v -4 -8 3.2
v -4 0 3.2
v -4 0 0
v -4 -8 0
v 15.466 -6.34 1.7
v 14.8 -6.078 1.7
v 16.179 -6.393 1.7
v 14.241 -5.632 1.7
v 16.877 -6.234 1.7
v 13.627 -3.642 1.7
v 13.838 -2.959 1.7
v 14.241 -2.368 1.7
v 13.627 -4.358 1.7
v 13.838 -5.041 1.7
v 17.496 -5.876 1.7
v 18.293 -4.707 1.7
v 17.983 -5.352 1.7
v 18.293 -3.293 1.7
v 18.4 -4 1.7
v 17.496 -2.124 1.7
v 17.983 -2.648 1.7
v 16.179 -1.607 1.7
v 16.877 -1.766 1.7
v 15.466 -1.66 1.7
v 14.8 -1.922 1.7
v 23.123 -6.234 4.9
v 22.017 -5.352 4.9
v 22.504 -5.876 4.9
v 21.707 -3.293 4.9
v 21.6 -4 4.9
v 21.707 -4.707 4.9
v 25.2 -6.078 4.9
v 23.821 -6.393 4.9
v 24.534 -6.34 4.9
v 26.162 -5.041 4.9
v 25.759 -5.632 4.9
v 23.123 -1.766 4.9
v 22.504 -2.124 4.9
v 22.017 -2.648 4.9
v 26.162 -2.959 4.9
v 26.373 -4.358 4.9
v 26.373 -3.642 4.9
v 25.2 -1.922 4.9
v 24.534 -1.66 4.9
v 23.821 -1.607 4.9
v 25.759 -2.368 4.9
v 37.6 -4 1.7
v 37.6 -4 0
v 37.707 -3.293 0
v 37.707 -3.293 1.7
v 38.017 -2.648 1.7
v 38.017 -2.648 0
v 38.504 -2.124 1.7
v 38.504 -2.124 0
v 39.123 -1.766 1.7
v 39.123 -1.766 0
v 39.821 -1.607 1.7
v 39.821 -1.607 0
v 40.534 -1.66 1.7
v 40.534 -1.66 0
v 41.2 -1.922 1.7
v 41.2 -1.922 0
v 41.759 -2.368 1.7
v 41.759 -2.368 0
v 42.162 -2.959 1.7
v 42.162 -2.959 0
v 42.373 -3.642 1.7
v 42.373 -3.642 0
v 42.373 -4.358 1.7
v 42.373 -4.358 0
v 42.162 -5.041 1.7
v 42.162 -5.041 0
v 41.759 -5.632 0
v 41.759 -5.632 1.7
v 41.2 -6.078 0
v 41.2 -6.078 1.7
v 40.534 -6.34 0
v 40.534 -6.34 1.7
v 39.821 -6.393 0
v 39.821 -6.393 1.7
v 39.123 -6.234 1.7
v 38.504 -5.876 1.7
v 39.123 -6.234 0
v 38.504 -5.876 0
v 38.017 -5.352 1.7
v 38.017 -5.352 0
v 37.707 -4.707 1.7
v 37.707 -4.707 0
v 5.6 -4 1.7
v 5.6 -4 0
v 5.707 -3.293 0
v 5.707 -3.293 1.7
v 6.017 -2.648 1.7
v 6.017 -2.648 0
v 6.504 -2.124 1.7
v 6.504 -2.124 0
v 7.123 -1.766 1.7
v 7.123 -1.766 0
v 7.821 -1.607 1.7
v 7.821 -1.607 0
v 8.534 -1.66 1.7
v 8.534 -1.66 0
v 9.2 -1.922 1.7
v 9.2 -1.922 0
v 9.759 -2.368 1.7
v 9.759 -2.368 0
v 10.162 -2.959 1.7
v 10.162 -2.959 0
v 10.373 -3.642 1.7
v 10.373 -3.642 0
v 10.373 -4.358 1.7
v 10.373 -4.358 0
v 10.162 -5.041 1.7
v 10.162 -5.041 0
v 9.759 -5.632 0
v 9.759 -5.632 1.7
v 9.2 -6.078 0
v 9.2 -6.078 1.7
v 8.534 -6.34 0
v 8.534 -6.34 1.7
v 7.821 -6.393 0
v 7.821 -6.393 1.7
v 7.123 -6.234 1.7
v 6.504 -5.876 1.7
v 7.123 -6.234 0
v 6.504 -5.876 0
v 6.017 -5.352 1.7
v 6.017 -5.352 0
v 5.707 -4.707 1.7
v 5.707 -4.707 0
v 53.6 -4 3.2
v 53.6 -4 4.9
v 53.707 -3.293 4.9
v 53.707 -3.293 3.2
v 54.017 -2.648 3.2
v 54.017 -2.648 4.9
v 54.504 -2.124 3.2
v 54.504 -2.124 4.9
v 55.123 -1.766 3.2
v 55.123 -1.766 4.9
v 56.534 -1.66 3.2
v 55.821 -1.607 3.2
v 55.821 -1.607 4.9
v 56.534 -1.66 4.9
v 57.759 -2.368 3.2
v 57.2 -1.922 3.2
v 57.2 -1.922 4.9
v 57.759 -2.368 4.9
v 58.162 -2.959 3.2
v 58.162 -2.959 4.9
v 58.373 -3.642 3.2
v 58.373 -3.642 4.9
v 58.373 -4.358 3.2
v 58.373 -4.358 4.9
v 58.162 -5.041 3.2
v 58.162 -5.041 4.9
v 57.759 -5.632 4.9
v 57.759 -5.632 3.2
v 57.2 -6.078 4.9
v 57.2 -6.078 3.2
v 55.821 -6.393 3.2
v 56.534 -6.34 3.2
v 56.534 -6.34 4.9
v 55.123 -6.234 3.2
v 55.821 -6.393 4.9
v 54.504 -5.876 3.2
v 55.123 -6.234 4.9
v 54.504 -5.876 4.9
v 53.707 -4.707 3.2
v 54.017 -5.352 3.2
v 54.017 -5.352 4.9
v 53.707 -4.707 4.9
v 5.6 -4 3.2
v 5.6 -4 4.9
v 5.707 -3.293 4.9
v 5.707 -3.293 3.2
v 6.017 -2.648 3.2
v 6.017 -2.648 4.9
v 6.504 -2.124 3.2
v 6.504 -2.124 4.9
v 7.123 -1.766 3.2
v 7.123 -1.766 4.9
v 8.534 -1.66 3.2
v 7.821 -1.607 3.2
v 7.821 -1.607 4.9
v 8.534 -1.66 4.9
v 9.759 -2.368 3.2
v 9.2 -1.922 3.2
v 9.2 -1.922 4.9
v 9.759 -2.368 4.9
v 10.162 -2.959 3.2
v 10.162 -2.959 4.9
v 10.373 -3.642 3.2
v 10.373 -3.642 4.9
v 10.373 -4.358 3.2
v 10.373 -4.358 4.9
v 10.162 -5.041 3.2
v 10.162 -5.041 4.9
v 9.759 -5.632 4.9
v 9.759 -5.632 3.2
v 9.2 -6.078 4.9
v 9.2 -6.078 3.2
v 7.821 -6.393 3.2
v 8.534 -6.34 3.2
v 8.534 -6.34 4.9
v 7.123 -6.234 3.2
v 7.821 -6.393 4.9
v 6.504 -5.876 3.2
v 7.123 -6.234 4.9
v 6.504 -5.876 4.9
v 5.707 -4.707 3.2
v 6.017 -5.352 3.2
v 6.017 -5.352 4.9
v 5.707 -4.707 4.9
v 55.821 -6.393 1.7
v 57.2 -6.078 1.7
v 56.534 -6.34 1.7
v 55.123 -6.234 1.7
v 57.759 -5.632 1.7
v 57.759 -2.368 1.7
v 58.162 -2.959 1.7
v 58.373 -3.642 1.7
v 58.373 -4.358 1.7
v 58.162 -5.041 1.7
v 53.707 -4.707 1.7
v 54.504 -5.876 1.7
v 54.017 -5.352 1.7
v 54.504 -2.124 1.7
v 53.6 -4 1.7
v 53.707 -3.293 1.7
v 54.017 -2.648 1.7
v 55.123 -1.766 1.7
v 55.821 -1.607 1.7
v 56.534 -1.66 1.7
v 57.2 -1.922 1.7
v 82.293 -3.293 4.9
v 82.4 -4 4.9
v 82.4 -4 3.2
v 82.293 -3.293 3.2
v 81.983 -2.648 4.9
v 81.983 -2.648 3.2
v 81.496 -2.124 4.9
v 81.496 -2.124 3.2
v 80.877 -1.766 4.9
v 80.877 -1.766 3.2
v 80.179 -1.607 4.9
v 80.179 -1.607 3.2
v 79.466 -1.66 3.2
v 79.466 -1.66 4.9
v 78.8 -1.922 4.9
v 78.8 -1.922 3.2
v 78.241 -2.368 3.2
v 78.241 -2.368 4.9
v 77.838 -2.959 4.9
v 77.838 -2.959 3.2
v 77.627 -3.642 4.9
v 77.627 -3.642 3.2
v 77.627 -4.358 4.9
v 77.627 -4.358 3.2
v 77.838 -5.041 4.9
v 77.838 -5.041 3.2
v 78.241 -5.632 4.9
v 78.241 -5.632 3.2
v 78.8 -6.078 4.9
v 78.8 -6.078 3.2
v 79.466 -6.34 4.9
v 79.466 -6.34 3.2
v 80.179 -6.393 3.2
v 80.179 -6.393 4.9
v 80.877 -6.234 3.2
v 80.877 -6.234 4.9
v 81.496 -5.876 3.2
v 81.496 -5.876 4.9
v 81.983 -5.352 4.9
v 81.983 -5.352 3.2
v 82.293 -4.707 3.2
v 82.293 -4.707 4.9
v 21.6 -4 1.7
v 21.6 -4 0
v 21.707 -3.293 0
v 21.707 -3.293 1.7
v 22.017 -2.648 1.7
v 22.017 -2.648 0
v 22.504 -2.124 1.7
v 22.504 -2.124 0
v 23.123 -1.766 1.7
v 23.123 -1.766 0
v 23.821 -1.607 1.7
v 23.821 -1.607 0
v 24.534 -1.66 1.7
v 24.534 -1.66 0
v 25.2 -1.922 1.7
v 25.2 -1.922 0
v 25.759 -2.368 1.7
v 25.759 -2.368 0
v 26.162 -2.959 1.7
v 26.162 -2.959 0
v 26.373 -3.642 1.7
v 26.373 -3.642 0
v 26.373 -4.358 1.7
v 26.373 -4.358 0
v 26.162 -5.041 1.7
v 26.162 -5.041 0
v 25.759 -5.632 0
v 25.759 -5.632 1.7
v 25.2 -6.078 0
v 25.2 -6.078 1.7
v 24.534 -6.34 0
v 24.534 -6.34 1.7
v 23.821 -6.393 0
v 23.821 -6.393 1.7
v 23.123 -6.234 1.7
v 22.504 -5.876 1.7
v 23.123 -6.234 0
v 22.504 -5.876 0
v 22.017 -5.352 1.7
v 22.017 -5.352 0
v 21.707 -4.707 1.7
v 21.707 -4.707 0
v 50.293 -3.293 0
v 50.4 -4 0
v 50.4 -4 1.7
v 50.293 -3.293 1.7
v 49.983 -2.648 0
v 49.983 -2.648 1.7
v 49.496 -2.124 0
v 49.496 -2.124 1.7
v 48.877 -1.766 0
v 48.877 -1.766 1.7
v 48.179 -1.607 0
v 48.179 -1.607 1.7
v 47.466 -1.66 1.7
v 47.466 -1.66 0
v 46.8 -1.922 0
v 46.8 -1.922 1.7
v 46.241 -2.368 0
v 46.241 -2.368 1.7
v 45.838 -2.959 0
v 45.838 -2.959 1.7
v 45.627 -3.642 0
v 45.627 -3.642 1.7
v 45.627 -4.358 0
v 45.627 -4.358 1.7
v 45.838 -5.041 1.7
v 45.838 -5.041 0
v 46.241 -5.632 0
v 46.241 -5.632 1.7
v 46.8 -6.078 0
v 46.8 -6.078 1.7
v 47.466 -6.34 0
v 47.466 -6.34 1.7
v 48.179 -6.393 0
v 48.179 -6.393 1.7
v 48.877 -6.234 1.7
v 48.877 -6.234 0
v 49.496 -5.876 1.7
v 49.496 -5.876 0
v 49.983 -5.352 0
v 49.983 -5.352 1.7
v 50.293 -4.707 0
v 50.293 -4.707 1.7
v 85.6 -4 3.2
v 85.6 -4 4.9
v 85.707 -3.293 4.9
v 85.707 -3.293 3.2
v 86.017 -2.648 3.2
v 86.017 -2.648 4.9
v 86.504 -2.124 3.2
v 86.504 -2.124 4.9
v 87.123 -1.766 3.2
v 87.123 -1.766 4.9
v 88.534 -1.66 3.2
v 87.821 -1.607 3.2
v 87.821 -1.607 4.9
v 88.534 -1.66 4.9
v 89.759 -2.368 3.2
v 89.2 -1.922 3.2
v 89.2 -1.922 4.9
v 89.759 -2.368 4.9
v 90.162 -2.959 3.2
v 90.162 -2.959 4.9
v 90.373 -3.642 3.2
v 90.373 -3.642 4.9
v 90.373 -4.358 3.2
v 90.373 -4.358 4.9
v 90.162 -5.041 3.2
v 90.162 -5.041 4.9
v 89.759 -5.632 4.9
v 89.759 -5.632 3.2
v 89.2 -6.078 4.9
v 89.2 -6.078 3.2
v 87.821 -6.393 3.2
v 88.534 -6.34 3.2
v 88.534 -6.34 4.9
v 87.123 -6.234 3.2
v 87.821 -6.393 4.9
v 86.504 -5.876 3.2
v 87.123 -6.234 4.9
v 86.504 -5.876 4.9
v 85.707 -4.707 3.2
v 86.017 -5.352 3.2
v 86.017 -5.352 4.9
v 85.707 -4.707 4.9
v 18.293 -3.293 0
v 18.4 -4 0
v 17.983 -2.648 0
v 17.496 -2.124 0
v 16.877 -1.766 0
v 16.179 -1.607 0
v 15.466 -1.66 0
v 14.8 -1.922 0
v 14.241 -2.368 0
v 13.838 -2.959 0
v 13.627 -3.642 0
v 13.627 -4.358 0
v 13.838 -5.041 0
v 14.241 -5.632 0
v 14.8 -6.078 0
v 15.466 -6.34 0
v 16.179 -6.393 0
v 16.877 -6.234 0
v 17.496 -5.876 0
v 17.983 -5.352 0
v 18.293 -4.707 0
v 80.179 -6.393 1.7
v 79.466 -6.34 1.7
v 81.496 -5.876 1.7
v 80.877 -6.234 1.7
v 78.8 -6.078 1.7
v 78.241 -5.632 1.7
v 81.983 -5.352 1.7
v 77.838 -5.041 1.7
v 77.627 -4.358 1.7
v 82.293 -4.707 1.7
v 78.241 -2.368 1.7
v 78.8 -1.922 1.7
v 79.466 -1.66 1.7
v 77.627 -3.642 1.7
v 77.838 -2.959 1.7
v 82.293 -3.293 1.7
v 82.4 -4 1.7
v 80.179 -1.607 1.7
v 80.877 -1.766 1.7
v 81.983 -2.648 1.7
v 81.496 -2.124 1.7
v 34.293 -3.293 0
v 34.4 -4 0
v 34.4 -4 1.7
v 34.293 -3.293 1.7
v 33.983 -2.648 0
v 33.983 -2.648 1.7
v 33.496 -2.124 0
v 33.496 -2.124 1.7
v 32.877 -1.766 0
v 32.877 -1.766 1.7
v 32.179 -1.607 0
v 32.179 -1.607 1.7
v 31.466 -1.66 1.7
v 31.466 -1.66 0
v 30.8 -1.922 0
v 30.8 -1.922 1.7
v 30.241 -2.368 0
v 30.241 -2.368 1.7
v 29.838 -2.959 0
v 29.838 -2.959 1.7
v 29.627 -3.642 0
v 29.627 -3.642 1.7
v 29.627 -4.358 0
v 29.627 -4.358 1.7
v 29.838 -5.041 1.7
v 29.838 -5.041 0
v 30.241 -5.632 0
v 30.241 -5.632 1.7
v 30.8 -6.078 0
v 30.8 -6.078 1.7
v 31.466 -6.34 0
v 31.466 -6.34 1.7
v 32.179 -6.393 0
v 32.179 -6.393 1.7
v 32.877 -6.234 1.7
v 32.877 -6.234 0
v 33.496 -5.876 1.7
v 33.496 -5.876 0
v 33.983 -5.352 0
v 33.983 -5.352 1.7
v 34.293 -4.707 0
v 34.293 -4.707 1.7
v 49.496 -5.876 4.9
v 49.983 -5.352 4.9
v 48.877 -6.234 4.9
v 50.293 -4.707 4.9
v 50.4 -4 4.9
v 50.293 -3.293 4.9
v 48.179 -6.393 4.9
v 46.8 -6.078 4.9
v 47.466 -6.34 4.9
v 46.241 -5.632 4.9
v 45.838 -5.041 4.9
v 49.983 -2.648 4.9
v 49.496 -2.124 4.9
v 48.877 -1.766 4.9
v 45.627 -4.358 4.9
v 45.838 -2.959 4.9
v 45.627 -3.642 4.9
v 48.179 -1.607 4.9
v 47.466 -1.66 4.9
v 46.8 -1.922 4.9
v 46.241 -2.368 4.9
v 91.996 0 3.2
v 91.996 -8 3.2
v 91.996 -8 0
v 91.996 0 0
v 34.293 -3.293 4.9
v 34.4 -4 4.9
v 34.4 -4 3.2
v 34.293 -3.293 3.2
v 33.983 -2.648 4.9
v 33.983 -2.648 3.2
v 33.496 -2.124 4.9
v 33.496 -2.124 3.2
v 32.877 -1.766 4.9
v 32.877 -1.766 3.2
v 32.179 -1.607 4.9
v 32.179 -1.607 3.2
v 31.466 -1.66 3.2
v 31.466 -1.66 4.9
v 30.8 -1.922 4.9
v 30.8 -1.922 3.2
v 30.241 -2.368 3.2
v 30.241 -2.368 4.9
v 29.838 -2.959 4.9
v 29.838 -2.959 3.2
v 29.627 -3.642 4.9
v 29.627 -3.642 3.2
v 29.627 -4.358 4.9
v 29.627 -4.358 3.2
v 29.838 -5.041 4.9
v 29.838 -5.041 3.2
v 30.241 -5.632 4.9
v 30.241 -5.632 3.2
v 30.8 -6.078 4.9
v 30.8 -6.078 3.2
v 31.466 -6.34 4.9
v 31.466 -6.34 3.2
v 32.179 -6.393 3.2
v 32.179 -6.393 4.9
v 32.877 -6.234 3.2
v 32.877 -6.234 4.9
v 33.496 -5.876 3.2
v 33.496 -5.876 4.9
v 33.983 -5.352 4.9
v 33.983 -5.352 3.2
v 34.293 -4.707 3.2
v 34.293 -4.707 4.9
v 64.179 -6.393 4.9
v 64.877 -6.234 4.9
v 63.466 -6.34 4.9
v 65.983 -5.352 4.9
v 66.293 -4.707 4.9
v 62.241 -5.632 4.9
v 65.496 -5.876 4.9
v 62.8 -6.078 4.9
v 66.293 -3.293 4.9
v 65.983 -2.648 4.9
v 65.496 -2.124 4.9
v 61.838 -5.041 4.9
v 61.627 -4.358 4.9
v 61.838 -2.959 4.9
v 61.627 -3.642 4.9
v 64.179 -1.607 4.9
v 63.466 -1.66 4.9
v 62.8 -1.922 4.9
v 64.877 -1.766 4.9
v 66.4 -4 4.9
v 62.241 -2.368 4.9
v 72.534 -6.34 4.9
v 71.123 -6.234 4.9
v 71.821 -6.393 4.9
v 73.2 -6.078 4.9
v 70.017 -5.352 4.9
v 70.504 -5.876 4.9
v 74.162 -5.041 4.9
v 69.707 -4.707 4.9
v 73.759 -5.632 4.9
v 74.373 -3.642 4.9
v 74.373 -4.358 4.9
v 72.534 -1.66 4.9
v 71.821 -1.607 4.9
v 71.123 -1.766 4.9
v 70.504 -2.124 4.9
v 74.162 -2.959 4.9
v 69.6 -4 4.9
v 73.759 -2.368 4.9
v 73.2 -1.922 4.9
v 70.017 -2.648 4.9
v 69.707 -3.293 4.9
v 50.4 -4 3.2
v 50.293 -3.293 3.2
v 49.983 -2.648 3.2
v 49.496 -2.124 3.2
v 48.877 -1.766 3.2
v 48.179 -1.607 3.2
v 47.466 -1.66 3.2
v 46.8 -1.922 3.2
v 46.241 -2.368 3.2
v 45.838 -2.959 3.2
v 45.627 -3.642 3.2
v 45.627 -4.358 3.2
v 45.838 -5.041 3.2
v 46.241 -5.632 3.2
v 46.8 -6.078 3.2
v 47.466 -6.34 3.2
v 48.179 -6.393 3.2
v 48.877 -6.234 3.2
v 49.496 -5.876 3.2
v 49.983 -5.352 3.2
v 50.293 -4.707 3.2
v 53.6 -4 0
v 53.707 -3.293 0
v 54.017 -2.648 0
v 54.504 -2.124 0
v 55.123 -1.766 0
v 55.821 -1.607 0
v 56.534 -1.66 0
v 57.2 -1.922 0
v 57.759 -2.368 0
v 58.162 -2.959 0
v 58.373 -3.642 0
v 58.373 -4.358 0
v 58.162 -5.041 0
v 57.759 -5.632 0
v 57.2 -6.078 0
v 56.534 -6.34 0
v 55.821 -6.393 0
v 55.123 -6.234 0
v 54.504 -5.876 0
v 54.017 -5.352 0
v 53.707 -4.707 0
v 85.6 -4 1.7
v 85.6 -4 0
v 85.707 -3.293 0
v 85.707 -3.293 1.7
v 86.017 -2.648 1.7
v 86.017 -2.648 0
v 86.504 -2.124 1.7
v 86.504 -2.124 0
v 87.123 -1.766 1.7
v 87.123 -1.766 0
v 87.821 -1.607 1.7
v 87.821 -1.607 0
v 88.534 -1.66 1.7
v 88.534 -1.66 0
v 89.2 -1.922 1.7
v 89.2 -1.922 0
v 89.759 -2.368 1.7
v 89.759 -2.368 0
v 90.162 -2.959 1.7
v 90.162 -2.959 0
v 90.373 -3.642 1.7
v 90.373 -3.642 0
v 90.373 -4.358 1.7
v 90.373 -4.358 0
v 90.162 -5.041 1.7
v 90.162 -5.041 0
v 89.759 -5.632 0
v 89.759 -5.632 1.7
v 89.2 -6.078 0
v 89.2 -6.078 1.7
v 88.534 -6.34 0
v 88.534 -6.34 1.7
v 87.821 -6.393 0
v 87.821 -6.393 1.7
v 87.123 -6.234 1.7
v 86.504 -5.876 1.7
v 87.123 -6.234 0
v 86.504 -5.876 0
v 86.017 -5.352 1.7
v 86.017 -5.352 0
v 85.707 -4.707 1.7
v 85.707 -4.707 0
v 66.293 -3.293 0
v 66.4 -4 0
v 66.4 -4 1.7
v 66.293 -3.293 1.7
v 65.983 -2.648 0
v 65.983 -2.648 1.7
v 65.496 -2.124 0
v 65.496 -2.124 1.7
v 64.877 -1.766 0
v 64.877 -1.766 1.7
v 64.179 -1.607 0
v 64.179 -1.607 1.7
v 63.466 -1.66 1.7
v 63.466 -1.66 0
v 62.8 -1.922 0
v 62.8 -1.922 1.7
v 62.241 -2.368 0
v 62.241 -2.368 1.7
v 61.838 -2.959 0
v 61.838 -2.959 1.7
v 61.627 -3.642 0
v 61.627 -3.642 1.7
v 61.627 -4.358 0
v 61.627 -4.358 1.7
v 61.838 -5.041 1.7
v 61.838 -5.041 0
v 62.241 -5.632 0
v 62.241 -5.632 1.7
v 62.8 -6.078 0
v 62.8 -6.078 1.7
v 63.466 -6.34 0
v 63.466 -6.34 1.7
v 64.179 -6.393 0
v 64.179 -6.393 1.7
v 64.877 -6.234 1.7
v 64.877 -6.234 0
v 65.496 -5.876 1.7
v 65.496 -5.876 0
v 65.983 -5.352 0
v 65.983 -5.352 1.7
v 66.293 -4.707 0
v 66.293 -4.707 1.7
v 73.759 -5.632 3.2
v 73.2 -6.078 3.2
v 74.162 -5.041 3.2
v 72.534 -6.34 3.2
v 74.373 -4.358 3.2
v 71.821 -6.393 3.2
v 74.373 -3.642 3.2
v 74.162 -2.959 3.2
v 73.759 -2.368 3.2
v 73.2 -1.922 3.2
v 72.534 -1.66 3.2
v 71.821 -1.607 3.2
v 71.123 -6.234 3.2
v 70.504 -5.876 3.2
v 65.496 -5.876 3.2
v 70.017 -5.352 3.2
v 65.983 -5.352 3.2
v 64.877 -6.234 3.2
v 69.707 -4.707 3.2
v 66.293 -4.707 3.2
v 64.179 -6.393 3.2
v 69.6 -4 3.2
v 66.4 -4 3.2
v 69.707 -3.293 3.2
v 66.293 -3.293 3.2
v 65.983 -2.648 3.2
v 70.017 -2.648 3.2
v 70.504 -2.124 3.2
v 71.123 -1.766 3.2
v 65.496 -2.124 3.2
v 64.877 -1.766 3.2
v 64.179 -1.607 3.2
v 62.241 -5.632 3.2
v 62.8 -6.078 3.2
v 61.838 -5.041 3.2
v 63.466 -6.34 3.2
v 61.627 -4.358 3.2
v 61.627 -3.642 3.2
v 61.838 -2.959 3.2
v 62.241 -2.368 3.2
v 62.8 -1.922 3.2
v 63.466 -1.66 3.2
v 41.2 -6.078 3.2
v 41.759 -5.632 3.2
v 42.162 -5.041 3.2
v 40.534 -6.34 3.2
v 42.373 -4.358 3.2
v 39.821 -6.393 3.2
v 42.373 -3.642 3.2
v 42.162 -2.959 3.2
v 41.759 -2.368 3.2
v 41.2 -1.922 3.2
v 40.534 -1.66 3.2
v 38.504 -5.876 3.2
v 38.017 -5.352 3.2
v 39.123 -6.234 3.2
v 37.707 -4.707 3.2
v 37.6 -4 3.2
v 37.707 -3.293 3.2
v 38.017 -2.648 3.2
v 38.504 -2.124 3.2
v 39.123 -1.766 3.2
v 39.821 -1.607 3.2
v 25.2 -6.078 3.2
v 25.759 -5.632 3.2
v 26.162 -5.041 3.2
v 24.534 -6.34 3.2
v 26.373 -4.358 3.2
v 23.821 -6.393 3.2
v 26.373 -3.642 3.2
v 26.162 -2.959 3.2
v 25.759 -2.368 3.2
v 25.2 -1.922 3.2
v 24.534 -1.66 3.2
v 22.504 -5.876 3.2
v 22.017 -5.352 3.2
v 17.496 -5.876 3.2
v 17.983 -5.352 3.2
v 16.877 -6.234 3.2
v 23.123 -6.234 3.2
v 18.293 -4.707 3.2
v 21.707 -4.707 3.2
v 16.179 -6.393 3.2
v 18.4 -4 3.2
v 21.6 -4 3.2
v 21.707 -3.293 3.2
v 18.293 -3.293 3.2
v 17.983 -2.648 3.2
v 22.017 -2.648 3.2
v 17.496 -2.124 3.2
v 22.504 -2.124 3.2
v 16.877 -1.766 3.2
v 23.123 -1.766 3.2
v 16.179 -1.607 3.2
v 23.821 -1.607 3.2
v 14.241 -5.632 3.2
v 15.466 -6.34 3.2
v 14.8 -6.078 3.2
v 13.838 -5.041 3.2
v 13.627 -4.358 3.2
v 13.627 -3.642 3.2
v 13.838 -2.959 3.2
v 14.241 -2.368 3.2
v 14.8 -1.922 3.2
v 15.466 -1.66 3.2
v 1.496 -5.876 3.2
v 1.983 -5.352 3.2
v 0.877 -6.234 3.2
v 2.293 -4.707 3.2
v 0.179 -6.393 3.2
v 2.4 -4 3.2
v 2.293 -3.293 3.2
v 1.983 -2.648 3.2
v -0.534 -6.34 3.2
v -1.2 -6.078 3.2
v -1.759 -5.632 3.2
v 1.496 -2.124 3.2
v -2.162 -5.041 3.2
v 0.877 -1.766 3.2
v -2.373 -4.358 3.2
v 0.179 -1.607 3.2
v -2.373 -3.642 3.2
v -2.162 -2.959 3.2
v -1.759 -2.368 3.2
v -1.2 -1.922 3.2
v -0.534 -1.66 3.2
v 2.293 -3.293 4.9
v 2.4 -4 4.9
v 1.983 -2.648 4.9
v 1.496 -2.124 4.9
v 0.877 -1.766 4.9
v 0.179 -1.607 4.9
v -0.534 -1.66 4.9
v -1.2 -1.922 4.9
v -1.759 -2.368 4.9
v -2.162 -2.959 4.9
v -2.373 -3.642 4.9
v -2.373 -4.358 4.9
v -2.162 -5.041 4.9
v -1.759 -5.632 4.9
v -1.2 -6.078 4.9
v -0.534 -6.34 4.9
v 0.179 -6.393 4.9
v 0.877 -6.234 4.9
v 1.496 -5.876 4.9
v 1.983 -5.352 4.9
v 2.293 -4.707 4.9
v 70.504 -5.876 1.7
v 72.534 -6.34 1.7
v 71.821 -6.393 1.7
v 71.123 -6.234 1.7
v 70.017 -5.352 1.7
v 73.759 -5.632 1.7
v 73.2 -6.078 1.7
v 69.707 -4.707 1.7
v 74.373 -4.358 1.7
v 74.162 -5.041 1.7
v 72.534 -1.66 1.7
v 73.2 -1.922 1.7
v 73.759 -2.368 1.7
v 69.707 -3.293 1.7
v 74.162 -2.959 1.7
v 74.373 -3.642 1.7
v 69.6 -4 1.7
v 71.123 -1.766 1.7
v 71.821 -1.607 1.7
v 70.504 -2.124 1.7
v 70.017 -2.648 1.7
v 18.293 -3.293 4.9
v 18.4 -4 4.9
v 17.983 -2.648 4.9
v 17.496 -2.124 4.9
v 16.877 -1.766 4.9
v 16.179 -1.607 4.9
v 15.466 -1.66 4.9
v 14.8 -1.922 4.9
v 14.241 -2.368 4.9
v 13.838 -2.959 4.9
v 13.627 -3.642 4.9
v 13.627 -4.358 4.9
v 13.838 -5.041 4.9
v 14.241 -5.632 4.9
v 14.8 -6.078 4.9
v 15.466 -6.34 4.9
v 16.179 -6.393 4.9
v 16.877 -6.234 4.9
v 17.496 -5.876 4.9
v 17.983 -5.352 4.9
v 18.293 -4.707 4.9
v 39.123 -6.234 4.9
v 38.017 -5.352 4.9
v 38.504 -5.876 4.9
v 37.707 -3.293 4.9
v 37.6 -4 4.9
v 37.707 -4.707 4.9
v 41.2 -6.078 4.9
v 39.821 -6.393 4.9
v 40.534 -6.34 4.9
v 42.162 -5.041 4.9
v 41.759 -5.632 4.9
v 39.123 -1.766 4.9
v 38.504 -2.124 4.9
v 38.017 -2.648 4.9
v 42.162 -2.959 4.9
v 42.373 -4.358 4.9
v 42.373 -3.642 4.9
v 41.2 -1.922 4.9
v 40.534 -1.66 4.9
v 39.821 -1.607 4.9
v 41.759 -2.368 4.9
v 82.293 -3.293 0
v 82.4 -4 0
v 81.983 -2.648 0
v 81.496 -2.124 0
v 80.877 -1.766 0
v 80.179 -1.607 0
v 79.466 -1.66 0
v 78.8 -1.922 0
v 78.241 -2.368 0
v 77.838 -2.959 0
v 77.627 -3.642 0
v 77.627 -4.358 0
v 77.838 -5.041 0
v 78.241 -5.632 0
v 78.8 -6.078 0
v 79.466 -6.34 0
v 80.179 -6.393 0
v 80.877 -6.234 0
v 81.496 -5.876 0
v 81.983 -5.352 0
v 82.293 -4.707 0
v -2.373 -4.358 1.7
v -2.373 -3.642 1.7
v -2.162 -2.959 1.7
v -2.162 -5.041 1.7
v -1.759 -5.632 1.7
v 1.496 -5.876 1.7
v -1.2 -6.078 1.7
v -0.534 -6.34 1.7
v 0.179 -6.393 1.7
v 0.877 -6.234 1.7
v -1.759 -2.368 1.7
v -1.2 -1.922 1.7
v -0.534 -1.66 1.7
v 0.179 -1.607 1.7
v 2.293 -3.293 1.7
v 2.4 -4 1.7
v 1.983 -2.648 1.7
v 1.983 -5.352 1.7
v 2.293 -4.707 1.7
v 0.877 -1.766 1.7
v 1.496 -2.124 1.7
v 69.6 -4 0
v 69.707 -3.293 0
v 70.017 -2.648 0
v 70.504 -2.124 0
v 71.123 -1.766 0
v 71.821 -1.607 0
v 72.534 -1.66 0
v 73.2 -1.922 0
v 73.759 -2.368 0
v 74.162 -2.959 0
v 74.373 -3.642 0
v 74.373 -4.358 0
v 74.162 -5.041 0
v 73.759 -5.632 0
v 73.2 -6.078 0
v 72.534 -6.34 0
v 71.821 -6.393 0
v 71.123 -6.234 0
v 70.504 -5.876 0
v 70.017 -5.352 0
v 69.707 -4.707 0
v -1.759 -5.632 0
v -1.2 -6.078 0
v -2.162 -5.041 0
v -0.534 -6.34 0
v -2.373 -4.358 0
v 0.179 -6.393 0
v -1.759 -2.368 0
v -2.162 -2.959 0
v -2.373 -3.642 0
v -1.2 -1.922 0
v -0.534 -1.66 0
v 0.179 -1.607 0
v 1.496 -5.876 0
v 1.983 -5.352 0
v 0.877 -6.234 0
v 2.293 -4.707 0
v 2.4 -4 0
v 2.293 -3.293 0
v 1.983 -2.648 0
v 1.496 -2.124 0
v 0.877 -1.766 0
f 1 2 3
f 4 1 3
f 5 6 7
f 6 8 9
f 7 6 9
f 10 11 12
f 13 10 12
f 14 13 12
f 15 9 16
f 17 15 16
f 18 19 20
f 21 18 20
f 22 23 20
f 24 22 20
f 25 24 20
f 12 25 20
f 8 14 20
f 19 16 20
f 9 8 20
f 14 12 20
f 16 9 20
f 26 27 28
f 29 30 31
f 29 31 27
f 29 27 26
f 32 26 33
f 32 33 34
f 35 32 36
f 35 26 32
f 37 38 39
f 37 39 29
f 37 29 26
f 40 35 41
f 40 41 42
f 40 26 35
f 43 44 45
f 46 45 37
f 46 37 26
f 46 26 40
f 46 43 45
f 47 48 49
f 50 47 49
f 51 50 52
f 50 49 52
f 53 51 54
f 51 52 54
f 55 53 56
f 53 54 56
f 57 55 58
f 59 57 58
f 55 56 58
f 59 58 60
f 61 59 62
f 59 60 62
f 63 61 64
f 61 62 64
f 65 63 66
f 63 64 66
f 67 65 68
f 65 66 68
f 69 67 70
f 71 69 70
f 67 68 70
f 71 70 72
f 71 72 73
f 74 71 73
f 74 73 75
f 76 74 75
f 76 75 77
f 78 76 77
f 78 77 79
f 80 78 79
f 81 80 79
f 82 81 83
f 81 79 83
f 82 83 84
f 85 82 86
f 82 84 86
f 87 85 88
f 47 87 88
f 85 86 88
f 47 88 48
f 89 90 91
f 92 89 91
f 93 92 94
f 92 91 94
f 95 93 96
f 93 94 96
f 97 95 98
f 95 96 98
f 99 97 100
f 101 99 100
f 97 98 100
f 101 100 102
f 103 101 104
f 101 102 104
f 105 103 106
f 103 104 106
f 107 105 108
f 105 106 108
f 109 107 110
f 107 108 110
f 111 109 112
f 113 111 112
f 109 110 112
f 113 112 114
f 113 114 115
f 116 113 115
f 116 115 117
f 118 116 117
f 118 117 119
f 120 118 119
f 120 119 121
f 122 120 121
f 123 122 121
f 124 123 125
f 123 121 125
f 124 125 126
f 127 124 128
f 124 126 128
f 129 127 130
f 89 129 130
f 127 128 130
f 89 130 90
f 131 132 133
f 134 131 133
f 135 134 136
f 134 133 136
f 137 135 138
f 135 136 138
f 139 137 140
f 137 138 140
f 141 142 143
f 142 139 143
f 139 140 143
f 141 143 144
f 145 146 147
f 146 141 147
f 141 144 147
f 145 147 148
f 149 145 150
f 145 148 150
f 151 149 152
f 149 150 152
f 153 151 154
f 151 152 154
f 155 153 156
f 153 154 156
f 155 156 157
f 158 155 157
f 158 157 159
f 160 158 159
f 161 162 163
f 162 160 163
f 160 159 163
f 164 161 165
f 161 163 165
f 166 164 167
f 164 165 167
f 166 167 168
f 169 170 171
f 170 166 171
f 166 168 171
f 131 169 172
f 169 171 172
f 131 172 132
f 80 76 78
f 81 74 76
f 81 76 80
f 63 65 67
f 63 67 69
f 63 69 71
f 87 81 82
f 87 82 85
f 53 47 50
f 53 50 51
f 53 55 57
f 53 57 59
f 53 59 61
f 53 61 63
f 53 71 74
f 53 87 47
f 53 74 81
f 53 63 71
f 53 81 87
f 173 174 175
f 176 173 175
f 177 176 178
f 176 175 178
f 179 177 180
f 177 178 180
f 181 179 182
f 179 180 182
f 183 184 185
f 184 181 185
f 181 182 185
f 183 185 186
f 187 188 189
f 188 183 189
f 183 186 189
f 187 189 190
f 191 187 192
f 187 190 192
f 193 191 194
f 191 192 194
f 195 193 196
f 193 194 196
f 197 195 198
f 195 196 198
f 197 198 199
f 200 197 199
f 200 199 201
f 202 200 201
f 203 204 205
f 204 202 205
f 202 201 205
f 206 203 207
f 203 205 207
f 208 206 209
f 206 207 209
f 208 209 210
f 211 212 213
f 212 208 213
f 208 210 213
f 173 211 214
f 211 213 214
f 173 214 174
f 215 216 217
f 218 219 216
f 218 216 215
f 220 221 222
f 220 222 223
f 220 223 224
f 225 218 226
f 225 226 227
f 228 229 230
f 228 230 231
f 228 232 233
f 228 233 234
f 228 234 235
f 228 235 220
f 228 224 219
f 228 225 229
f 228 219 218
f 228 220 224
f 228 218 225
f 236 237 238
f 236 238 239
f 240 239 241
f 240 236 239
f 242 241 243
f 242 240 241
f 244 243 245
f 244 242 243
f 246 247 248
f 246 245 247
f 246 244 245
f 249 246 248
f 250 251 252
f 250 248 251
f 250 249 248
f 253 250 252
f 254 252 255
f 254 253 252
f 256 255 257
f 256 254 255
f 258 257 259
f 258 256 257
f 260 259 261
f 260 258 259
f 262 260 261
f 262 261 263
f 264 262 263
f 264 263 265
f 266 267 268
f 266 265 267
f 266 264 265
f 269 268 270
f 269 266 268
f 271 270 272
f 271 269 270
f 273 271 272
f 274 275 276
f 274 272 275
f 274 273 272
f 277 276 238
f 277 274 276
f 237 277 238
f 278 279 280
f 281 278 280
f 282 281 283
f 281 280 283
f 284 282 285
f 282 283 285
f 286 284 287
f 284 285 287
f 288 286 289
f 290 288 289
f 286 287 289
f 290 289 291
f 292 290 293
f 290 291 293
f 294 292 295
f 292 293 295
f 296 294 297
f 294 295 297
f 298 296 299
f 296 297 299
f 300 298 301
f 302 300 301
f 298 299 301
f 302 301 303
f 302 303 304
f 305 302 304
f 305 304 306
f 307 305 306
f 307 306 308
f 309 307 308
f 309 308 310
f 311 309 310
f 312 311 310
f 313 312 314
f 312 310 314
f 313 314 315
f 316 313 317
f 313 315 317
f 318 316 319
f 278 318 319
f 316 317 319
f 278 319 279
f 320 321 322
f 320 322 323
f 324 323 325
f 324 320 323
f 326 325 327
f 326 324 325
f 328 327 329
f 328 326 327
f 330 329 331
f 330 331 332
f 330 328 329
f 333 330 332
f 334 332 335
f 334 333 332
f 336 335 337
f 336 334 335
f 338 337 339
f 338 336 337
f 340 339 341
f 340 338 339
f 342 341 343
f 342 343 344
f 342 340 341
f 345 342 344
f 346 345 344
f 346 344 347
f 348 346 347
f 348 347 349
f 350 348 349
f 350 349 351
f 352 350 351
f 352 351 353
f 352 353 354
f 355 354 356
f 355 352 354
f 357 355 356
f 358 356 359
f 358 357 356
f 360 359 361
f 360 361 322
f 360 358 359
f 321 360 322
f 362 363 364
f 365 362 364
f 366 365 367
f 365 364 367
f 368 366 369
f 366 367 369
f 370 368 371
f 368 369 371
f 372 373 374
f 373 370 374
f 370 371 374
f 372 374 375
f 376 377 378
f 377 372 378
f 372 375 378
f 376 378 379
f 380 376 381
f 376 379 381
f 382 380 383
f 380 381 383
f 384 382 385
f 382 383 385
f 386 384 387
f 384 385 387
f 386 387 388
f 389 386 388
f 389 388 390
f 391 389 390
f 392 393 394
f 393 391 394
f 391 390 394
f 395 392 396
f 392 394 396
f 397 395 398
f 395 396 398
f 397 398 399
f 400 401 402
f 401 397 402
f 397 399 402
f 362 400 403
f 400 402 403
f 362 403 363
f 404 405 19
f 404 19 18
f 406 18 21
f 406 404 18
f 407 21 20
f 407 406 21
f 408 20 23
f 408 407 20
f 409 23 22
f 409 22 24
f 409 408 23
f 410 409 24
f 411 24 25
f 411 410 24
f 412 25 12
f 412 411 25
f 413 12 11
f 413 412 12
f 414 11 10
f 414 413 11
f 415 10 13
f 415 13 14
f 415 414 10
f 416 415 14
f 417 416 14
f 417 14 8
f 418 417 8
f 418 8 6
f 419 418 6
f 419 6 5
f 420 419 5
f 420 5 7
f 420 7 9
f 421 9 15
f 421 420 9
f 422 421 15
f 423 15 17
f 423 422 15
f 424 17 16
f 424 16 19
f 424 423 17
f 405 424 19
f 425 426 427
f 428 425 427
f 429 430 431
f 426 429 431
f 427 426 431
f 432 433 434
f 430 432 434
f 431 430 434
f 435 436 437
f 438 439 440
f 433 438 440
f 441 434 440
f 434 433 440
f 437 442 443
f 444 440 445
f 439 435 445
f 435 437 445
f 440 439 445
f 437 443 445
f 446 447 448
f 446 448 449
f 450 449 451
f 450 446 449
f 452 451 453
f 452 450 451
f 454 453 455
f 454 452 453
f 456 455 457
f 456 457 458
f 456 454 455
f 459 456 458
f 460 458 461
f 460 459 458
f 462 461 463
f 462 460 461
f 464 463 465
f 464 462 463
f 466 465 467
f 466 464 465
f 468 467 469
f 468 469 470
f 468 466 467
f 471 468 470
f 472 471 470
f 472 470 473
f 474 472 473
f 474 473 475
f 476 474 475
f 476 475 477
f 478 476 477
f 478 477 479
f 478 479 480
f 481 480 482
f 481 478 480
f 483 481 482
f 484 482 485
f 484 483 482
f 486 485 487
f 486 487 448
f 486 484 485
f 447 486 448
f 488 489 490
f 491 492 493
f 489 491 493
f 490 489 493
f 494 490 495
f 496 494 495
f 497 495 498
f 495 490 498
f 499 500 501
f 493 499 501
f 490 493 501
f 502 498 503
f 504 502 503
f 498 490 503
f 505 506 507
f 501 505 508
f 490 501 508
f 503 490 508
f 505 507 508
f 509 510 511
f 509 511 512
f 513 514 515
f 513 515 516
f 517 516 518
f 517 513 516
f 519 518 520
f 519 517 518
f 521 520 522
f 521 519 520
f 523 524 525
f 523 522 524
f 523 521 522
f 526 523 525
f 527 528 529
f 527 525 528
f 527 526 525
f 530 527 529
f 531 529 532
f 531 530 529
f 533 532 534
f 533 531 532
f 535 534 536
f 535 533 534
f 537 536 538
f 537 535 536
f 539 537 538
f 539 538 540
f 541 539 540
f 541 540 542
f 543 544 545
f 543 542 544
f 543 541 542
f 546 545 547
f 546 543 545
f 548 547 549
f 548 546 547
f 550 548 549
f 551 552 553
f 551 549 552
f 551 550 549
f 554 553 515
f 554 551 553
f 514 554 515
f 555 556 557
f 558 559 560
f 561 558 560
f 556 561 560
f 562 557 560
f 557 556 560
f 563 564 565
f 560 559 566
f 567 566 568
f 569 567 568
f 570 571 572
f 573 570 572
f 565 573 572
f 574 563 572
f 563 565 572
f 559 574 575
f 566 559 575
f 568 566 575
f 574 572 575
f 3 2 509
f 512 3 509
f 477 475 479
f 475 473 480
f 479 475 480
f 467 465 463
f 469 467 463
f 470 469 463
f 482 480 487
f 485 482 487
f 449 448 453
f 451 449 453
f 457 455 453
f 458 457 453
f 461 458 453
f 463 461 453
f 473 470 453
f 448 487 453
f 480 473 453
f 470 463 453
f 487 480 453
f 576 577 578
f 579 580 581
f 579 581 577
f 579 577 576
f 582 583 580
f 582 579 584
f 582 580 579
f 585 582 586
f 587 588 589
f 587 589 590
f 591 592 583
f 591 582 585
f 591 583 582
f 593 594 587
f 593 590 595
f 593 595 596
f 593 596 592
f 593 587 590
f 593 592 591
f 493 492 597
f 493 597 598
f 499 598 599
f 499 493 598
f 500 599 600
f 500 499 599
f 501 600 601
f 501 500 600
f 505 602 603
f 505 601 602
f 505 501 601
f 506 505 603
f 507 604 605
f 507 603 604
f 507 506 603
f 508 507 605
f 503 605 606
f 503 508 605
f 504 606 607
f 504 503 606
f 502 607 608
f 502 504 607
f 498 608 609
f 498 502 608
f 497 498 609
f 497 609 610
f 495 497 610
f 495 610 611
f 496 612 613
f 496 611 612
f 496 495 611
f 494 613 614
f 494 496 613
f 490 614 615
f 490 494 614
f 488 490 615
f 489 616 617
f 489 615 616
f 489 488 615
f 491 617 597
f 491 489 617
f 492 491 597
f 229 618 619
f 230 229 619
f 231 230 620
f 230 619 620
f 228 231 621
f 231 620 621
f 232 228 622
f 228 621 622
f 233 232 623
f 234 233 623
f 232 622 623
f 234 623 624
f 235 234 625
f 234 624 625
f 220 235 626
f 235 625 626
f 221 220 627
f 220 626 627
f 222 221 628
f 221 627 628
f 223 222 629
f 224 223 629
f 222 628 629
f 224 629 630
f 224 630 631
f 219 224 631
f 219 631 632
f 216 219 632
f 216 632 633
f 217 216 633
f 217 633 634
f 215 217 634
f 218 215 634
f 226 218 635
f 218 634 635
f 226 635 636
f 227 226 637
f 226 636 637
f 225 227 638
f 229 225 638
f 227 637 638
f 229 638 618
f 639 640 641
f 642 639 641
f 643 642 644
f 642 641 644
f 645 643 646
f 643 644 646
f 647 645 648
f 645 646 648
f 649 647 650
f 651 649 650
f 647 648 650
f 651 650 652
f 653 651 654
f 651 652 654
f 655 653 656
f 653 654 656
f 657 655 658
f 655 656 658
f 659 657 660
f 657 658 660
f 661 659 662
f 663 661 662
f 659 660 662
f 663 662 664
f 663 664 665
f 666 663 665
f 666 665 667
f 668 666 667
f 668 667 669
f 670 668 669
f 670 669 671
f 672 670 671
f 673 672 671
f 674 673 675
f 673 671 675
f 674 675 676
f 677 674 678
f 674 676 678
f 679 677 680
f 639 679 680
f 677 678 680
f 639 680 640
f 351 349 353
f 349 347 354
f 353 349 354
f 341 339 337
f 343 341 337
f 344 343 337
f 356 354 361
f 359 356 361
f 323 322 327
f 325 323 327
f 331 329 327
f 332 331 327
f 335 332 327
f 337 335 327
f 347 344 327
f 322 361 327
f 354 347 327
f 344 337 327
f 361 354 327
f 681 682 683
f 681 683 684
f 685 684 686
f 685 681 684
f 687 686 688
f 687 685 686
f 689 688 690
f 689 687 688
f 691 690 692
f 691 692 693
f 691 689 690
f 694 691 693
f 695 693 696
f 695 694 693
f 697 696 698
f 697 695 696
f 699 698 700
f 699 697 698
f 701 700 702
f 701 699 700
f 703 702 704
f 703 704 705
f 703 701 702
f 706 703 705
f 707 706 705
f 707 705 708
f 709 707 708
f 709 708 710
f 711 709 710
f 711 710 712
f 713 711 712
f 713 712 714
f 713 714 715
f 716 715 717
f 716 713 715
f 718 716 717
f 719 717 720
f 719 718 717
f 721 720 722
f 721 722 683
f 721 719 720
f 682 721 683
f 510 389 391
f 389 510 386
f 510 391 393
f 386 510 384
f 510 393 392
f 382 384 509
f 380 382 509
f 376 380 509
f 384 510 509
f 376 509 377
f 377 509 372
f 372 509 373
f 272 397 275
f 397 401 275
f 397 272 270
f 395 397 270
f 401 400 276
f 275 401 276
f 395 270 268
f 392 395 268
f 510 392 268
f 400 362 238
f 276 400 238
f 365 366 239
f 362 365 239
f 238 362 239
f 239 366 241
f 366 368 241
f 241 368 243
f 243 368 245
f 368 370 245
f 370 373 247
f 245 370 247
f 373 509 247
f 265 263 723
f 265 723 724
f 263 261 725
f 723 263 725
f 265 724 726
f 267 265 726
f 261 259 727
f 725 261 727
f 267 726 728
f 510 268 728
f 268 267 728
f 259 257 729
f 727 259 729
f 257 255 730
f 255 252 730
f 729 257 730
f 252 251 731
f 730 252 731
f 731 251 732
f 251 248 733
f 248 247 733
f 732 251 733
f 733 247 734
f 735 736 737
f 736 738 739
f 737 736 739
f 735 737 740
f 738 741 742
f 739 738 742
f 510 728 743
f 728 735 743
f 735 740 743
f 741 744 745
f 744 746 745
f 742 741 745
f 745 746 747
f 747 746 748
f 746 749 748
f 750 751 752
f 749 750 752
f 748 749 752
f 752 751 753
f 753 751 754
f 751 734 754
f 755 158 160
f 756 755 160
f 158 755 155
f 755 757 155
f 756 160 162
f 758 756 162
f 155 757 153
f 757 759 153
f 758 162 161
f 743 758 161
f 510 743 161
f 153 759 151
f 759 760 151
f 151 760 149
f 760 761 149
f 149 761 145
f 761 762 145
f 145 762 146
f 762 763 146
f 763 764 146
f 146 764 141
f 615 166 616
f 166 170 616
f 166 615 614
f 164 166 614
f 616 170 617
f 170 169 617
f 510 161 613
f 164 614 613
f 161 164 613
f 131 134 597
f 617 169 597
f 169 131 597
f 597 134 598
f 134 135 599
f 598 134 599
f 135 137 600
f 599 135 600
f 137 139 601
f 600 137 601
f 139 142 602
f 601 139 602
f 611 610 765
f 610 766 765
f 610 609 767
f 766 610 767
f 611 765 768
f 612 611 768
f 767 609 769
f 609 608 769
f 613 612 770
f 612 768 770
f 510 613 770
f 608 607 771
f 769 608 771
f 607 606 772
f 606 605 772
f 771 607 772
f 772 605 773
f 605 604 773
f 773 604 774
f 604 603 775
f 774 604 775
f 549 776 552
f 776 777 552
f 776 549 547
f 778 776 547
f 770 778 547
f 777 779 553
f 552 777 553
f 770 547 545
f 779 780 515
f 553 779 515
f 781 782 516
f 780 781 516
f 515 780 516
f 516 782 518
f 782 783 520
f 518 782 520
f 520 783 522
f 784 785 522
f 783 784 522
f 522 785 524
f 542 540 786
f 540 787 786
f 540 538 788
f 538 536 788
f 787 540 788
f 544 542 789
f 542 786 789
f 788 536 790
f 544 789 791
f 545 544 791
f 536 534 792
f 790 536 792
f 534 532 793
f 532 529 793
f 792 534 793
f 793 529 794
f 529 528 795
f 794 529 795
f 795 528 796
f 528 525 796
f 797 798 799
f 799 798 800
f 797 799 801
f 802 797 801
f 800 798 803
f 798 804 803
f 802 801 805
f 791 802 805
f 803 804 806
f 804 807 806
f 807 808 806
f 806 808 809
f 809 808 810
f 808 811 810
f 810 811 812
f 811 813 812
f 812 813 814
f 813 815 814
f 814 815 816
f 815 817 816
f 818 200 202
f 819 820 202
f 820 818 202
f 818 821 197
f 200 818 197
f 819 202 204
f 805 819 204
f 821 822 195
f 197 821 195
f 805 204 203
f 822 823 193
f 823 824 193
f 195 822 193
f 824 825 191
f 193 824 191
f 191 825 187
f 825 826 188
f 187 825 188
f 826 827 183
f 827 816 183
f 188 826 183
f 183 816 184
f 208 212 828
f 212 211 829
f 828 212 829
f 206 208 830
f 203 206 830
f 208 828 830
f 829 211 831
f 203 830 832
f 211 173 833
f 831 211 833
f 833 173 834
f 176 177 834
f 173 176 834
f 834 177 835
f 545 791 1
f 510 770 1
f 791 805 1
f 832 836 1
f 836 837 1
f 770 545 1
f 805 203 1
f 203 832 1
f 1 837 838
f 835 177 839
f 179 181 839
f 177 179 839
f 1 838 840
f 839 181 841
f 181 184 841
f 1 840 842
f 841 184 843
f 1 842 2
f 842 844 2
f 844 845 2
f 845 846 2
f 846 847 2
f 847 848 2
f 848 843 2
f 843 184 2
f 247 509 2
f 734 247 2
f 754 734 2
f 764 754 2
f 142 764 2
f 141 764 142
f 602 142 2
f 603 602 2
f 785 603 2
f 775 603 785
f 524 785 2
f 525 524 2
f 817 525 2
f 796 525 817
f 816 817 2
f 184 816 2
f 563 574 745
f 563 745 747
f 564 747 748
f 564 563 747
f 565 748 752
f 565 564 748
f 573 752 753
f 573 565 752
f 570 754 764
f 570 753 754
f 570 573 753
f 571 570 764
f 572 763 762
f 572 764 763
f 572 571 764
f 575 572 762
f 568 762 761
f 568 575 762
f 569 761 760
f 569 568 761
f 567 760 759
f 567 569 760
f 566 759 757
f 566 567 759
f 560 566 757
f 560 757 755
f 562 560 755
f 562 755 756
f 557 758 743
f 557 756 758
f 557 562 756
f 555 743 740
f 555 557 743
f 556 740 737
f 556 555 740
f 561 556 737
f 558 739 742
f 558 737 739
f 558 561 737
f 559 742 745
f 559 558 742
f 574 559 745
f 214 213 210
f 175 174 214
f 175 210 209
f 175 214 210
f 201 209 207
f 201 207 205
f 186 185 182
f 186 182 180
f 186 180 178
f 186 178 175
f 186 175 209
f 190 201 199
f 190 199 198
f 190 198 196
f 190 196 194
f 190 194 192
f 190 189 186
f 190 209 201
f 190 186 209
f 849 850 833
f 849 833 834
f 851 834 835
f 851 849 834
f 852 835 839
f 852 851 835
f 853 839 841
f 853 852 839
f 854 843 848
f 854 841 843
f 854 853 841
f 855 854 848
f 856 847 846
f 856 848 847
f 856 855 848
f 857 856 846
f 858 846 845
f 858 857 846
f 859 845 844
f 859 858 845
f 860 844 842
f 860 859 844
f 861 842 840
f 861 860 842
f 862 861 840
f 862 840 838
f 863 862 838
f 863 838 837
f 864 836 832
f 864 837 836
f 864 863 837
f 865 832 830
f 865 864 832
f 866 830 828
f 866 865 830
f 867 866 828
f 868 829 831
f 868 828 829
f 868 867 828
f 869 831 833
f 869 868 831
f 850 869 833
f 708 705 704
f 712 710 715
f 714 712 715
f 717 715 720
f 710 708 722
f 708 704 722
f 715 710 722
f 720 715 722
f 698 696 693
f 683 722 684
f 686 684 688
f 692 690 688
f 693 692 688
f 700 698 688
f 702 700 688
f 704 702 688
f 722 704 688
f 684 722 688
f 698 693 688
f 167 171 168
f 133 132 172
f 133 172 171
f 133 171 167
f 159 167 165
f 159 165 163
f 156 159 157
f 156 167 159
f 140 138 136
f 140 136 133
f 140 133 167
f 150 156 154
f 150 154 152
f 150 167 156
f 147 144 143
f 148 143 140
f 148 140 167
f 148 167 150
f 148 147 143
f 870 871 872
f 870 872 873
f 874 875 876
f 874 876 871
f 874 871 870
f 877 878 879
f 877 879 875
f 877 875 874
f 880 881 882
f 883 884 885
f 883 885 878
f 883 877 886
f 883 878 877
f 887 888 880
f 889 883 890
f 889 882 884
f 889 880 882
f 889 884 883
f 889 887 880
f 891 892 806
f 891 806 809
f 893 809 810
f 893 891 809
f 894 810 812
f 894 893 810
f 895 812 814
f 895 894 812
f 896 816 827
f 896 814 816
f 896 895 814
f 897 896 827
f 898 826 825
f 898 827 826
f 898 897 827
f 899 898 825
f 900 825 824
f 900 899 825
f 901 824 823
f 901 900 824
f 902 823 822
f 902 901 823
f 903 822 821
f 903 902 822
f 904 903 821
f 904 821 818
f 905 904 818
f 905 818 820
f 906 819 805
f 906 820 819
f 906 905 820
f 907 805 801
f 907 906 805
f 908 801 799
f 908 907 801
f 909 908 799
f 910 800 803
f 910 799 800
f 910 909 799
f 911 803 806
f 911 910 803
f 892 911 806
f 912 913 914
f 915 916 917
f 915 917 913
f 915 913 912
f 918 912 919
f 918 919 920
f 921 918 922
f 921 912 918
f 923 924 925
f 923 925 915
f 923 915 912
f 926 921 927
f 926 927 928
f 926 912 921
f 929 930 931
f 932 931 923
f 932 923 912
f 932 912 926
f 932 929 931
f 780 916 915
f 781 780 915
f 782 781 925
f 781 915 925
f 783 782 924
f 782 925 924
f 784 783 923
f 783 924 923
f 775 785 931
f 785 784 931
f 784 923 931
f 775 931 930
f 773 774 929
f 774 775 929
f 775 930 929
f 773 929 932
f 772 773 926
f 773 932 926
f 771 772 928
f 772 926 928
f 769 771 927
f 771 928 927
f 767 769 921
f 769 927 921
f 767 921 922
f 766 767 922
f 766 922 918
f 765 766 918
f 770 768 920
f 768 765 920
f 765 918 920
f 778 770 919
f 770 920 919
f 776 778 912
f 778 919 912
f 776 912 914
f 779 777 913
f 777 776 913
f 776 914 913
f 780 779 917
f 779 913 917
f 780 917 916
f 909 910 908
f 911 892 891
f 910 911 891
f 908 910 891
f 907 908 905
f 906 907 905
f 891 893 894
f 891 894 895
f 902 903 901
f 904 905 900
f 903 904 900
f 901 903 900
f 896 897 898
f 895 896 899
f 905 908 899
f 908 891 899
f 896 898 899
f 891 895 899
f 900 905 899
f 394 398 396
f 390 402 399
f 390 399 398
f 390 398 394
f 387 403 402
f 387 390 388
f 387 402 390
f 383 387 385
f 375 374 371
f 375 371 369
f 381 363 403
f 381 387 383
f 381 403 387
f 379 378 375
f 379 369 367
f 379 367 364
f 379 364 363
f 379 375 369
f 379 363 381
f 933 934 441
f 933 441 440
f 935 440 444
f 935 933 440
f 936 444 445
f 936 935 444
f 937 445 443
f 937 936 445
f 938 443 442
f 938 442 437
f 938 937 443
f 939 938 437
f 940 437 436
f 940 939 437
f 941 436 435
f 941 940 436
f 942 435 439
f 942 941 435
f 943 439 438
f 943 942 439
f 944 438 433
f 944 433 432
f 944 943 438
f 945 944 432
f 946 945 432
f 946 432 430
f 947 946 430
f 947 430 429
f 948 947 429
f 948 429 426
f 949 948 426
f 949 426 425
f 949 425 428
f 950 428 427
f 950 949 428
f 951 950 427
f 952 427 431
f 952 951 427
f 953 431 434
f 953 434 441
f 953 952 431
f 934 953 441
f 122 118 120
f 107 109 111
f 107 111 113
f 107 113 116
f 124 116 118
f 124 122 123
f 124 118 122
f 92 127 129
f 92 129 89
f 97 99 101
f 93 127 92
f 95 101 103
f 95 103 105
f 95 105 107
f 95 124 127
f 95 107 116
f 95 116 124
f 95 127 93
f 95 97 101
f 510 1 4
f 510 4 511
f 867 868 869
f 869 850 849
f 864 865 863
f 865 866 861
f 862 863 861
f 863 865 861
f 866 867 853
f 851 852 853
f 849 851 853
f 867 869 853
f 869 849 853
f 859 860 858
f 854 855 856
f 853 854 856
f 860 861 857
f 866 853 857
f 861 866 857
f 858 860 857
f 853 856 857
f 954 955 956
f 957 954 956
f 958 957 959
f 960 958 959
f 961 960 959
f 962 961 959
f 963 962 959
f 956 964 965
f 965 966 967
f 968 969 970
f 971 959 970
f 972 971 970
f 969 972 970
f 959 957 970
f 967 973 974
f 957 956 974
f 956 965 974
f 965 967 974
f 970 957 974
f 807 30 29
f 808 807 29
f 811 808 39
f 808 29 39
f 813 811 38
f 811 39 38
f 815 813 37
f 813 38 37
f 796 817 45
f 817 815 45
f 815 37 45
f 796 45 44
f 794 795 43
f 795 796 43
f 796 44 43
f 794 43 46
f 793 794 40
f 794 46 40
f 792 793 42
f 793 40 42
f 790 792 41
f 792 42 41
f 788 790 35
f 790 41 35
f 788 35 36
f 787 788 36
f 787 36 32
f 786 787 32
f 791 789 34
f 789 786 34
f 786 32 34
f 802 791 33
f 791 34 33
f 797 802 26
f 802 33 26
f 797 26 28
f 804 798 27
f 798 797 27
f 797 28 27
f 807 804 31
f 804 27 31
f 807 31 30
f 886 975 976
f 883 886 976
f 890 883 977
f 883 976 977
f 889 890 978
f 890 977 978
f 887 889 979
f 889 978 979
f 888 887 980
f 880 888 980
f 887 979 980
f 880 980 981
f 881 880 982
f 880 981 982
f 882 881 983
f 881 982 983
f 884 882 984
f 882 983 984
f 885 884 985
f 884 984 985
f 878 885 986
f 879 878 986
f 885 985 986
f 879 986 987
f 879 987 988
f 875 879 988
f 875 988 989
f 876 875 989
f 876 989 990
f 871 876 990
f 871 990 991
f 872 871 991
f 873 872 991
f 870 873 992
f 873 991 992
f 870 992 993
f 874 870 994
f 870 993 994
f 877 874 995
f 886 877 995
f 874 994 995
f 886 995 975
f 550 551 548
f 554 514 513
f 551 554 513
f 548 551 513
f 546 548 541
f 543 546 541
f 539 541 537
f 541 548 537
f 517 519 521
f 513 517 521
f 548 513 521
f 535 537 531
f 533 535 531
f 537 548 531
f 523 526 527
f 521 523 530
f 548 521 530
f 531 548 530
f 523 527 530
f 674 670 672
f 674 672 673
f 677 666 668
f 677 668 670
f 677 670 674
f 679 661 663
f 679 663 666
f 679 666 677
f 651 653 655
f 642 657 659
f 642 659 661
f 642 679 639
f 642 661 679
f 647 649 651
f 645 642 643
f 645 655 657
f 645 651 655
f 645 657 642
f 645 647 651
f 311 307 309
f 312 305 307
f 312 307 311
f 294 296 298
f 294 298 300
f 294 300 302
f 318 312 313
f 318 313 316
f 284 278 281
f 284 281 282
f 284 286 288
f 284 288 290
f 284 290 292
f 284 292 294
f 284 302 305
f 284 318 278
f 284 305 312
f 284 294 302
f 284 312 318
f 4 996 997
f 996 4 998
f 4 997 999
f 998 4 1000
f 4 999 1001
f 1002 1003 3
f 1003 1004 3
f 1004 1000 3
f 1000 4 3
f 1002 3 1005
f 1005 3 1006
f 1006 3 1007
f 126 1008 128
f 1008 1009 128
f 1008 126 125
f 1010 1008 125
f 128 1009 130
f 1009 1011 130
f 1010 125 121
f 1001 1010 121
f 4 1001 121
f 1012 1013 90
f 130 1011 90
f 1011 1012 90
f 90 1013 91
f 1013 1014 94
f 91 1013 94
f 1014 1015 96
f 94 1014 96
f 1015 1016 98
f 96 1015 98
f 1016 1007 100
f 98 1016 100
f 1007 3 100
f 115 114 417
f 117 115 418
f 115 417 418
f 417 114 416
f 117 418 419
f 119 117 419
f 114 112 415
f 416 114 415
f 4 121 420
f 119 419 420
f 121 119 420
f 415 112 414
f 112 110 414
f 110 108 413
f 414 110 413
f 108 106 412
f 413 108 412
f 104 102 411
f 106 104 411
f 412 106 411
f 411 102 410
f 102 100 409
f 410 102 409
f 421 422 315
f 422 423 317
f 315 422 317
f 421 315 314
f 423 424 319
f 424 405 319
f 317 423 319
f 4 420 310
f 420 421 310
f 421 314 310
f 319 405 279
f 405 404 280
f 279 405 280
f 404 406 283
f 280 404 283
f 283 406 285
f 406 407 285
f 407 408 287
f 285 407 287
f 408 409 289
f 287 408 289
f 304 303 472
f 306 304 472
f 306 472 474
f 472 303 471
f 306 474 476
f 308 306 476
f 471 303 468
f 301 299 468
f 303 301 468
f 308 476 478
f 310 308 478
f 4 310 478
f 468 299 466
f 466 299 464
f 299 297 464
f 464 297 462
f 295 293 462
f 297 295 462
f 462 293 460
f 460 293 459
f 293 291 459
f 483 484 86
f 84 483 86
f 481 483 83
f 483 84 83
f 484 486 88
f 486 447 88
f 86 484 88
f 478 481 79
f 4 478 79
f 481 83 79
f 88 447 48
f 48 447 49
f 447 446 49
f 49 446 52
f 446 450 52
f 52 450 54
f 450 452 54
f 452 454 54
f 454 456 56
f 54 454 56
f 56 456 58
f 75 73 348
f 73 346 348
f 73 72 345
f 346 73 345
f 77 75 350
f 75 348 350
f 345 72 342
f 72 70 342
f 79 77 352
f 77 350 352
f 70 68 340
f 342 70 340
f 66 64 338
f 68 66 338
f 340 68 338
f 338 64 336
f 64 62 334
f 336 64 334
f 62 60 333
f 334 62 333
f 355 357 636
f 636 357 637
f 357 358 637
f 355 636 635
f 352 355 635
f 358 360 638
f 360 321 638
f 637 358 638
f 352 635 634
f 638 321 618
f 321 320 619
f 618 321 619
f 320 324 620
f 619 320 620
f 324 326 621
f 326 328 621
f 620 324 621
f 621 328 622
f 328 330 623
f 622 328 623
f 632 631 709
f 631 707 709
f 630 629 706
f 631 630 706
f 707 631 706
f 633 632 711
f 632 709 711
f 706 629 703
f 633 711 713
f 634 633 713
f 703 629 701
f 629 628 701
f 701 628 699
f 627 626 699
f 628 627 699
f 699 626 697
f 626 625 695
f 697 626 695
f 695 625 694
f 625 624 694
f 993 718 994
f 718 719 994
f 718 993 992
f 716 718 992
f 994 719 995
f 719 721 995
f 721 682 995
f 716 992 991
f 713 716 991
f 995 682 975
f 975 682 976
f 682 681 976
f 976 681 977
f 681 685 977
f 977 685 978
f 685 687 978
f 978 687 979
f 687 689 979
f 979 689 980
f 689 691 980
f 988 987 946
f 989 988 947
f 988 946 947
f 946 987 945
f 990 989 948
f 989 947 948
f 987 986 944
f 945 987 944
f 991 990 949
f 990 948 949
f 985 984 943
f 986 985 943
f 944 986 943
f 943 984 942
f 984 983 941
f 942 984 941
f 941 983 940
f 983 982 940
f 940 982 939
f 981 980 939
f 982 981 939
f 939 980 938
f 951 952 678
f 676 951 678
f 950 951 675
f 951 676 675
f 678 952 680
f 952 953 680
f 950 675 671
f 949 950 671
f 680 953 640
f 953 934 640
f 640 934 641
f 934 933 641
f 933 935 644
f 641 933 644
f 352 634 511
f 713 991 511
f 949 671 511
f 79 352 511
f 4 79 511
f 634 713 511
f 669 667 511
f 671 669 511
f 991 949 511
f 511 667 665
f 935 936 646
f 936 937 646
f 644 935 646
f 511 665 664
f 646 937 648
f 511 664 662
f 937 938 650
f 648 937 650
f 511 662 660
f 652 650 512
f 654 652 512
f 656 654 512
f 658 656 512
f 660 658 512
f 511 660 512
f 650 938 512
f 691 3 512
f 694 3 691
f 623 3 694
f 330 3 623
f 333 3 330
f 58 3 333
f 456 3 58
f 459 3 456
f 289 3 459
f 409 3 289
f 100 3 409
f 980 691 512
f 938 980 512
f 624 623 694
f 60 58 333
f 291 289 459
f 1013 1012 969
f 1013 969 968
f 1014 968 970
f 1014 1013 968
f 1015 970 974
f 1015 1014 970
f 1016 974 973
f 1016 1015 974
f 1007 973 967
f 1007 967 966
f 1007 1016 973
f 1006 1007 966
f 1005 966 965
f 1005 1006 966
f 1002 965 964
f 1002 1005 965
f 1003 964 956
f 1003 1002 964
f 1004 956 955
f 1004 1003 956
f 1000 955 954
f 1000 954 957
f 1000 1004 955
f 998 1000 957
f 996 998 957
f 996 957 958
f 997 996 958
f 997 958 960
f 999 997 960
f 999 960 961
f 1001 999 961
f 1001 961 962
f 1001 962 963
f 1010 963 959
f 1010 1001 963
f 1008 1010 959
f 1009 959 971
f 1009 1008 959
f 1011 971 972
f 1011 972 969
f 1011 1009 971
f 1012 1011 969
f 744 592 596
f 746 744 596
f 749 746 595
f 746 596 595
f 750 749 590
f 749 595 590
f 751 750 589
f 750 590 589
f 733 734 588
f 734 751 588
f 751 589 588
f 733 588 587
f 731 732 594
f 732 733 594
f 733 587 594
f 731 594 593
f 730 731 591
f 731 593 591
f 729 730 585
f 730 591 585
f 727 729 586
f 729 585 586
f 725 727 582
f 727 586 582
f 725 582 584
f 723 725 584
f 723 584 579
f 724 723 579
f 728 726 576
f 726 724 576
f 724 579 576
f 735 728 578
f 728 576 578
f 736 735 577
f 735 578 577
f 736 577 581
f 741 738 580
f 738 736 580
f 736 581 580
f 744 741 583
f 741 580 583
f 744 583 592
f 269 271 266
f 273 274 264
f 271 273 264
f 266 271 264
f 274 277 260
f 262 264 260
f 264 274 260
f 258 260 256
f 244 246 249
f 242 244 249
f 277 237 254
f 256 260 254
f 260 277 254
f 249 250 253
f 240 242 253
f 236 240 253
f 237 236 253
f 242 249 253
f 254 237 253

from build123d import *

# Parameters (mm, degrees)
F1_DEPTH  = 8
F3_W      = 8
F3_H      = 8
F3_R      = 2.4
F4_DEPTH  = 1.7
F5_R      = 2.4
F6_DEPTH  = 1.7
F14_W     = 31.3753262162
F14_H     = 26.4205296278
F15_DEPTH = 32.004


with BuildPart() as f1:
    # F0 (on Front) → F1 (new body)
    with BuildSketch(Plane.XZ):
        Polygon((-2.4, 3.2), (-4, 3.2), (-4, 0), (4, 0), (4, 3.2), (2.4, 3.2), (2.4, 4.9), (-2.4, 4.9), align=None)
    extrude(amount=F1_DEPTH)

    # F3 (on plane+point) → F4 (cut, through all)
    with BuildSketch(Plane.XY.offset(4.9)):
        with Locations((0, -4)):
            Rectangle(F3_W, F3_H)
        with Locations((0, -4)):
            Circle(F3_R, mode=Mode.SUBTRACT)
    extrude(amount=-F4_DEPTH, mode=Mode.SUBTRACT)

    # F5 (on Top) → F6 (cut)
    with BuildSketch(Plane.XY):
        with Locations((0, -4)):
            Circle(F5_R)
    extrude(amount=F6_DEPTH, mode=Mode.SUBTRACT)

    # F8: F1 across plane


with BuildPart() as f1_1:
    add(f1.part)
    add(f1.part.mirror(Plane.YZ.offset(4)))

    # F10: F1 across plane


with BuildPart() as f1_2:
    add(f1_1.part)
    add(f1_1.part.mirror(Plane.YZ.offset(12)))

    # F12: F1 across plane


with BuildPart() as f1_3:
    add(f1_2.part)
    add(f1_2.part.mirror(Plane.YZ.offset(28)))

    # F13: F1 across face


with BuildPart() as f1_4:
    add(f1_3.part)
    add(f1_3.part.mirror(Plane(origin=(60, -4, 1.6), x_dir=(0, 1, 0), z_dir=(1, 0, 0))))

    # F14 (on face) → F15 (cut)
    with BuildSketch(Plane.YZ.offset(124)):
        with Locations((0, 3.2)):
            Rectangle(F14_W, F14_H)
    extrude(amount=-F15_DEPTH, mode=Mode.SUBTRACT)


solid = f1_4.part
